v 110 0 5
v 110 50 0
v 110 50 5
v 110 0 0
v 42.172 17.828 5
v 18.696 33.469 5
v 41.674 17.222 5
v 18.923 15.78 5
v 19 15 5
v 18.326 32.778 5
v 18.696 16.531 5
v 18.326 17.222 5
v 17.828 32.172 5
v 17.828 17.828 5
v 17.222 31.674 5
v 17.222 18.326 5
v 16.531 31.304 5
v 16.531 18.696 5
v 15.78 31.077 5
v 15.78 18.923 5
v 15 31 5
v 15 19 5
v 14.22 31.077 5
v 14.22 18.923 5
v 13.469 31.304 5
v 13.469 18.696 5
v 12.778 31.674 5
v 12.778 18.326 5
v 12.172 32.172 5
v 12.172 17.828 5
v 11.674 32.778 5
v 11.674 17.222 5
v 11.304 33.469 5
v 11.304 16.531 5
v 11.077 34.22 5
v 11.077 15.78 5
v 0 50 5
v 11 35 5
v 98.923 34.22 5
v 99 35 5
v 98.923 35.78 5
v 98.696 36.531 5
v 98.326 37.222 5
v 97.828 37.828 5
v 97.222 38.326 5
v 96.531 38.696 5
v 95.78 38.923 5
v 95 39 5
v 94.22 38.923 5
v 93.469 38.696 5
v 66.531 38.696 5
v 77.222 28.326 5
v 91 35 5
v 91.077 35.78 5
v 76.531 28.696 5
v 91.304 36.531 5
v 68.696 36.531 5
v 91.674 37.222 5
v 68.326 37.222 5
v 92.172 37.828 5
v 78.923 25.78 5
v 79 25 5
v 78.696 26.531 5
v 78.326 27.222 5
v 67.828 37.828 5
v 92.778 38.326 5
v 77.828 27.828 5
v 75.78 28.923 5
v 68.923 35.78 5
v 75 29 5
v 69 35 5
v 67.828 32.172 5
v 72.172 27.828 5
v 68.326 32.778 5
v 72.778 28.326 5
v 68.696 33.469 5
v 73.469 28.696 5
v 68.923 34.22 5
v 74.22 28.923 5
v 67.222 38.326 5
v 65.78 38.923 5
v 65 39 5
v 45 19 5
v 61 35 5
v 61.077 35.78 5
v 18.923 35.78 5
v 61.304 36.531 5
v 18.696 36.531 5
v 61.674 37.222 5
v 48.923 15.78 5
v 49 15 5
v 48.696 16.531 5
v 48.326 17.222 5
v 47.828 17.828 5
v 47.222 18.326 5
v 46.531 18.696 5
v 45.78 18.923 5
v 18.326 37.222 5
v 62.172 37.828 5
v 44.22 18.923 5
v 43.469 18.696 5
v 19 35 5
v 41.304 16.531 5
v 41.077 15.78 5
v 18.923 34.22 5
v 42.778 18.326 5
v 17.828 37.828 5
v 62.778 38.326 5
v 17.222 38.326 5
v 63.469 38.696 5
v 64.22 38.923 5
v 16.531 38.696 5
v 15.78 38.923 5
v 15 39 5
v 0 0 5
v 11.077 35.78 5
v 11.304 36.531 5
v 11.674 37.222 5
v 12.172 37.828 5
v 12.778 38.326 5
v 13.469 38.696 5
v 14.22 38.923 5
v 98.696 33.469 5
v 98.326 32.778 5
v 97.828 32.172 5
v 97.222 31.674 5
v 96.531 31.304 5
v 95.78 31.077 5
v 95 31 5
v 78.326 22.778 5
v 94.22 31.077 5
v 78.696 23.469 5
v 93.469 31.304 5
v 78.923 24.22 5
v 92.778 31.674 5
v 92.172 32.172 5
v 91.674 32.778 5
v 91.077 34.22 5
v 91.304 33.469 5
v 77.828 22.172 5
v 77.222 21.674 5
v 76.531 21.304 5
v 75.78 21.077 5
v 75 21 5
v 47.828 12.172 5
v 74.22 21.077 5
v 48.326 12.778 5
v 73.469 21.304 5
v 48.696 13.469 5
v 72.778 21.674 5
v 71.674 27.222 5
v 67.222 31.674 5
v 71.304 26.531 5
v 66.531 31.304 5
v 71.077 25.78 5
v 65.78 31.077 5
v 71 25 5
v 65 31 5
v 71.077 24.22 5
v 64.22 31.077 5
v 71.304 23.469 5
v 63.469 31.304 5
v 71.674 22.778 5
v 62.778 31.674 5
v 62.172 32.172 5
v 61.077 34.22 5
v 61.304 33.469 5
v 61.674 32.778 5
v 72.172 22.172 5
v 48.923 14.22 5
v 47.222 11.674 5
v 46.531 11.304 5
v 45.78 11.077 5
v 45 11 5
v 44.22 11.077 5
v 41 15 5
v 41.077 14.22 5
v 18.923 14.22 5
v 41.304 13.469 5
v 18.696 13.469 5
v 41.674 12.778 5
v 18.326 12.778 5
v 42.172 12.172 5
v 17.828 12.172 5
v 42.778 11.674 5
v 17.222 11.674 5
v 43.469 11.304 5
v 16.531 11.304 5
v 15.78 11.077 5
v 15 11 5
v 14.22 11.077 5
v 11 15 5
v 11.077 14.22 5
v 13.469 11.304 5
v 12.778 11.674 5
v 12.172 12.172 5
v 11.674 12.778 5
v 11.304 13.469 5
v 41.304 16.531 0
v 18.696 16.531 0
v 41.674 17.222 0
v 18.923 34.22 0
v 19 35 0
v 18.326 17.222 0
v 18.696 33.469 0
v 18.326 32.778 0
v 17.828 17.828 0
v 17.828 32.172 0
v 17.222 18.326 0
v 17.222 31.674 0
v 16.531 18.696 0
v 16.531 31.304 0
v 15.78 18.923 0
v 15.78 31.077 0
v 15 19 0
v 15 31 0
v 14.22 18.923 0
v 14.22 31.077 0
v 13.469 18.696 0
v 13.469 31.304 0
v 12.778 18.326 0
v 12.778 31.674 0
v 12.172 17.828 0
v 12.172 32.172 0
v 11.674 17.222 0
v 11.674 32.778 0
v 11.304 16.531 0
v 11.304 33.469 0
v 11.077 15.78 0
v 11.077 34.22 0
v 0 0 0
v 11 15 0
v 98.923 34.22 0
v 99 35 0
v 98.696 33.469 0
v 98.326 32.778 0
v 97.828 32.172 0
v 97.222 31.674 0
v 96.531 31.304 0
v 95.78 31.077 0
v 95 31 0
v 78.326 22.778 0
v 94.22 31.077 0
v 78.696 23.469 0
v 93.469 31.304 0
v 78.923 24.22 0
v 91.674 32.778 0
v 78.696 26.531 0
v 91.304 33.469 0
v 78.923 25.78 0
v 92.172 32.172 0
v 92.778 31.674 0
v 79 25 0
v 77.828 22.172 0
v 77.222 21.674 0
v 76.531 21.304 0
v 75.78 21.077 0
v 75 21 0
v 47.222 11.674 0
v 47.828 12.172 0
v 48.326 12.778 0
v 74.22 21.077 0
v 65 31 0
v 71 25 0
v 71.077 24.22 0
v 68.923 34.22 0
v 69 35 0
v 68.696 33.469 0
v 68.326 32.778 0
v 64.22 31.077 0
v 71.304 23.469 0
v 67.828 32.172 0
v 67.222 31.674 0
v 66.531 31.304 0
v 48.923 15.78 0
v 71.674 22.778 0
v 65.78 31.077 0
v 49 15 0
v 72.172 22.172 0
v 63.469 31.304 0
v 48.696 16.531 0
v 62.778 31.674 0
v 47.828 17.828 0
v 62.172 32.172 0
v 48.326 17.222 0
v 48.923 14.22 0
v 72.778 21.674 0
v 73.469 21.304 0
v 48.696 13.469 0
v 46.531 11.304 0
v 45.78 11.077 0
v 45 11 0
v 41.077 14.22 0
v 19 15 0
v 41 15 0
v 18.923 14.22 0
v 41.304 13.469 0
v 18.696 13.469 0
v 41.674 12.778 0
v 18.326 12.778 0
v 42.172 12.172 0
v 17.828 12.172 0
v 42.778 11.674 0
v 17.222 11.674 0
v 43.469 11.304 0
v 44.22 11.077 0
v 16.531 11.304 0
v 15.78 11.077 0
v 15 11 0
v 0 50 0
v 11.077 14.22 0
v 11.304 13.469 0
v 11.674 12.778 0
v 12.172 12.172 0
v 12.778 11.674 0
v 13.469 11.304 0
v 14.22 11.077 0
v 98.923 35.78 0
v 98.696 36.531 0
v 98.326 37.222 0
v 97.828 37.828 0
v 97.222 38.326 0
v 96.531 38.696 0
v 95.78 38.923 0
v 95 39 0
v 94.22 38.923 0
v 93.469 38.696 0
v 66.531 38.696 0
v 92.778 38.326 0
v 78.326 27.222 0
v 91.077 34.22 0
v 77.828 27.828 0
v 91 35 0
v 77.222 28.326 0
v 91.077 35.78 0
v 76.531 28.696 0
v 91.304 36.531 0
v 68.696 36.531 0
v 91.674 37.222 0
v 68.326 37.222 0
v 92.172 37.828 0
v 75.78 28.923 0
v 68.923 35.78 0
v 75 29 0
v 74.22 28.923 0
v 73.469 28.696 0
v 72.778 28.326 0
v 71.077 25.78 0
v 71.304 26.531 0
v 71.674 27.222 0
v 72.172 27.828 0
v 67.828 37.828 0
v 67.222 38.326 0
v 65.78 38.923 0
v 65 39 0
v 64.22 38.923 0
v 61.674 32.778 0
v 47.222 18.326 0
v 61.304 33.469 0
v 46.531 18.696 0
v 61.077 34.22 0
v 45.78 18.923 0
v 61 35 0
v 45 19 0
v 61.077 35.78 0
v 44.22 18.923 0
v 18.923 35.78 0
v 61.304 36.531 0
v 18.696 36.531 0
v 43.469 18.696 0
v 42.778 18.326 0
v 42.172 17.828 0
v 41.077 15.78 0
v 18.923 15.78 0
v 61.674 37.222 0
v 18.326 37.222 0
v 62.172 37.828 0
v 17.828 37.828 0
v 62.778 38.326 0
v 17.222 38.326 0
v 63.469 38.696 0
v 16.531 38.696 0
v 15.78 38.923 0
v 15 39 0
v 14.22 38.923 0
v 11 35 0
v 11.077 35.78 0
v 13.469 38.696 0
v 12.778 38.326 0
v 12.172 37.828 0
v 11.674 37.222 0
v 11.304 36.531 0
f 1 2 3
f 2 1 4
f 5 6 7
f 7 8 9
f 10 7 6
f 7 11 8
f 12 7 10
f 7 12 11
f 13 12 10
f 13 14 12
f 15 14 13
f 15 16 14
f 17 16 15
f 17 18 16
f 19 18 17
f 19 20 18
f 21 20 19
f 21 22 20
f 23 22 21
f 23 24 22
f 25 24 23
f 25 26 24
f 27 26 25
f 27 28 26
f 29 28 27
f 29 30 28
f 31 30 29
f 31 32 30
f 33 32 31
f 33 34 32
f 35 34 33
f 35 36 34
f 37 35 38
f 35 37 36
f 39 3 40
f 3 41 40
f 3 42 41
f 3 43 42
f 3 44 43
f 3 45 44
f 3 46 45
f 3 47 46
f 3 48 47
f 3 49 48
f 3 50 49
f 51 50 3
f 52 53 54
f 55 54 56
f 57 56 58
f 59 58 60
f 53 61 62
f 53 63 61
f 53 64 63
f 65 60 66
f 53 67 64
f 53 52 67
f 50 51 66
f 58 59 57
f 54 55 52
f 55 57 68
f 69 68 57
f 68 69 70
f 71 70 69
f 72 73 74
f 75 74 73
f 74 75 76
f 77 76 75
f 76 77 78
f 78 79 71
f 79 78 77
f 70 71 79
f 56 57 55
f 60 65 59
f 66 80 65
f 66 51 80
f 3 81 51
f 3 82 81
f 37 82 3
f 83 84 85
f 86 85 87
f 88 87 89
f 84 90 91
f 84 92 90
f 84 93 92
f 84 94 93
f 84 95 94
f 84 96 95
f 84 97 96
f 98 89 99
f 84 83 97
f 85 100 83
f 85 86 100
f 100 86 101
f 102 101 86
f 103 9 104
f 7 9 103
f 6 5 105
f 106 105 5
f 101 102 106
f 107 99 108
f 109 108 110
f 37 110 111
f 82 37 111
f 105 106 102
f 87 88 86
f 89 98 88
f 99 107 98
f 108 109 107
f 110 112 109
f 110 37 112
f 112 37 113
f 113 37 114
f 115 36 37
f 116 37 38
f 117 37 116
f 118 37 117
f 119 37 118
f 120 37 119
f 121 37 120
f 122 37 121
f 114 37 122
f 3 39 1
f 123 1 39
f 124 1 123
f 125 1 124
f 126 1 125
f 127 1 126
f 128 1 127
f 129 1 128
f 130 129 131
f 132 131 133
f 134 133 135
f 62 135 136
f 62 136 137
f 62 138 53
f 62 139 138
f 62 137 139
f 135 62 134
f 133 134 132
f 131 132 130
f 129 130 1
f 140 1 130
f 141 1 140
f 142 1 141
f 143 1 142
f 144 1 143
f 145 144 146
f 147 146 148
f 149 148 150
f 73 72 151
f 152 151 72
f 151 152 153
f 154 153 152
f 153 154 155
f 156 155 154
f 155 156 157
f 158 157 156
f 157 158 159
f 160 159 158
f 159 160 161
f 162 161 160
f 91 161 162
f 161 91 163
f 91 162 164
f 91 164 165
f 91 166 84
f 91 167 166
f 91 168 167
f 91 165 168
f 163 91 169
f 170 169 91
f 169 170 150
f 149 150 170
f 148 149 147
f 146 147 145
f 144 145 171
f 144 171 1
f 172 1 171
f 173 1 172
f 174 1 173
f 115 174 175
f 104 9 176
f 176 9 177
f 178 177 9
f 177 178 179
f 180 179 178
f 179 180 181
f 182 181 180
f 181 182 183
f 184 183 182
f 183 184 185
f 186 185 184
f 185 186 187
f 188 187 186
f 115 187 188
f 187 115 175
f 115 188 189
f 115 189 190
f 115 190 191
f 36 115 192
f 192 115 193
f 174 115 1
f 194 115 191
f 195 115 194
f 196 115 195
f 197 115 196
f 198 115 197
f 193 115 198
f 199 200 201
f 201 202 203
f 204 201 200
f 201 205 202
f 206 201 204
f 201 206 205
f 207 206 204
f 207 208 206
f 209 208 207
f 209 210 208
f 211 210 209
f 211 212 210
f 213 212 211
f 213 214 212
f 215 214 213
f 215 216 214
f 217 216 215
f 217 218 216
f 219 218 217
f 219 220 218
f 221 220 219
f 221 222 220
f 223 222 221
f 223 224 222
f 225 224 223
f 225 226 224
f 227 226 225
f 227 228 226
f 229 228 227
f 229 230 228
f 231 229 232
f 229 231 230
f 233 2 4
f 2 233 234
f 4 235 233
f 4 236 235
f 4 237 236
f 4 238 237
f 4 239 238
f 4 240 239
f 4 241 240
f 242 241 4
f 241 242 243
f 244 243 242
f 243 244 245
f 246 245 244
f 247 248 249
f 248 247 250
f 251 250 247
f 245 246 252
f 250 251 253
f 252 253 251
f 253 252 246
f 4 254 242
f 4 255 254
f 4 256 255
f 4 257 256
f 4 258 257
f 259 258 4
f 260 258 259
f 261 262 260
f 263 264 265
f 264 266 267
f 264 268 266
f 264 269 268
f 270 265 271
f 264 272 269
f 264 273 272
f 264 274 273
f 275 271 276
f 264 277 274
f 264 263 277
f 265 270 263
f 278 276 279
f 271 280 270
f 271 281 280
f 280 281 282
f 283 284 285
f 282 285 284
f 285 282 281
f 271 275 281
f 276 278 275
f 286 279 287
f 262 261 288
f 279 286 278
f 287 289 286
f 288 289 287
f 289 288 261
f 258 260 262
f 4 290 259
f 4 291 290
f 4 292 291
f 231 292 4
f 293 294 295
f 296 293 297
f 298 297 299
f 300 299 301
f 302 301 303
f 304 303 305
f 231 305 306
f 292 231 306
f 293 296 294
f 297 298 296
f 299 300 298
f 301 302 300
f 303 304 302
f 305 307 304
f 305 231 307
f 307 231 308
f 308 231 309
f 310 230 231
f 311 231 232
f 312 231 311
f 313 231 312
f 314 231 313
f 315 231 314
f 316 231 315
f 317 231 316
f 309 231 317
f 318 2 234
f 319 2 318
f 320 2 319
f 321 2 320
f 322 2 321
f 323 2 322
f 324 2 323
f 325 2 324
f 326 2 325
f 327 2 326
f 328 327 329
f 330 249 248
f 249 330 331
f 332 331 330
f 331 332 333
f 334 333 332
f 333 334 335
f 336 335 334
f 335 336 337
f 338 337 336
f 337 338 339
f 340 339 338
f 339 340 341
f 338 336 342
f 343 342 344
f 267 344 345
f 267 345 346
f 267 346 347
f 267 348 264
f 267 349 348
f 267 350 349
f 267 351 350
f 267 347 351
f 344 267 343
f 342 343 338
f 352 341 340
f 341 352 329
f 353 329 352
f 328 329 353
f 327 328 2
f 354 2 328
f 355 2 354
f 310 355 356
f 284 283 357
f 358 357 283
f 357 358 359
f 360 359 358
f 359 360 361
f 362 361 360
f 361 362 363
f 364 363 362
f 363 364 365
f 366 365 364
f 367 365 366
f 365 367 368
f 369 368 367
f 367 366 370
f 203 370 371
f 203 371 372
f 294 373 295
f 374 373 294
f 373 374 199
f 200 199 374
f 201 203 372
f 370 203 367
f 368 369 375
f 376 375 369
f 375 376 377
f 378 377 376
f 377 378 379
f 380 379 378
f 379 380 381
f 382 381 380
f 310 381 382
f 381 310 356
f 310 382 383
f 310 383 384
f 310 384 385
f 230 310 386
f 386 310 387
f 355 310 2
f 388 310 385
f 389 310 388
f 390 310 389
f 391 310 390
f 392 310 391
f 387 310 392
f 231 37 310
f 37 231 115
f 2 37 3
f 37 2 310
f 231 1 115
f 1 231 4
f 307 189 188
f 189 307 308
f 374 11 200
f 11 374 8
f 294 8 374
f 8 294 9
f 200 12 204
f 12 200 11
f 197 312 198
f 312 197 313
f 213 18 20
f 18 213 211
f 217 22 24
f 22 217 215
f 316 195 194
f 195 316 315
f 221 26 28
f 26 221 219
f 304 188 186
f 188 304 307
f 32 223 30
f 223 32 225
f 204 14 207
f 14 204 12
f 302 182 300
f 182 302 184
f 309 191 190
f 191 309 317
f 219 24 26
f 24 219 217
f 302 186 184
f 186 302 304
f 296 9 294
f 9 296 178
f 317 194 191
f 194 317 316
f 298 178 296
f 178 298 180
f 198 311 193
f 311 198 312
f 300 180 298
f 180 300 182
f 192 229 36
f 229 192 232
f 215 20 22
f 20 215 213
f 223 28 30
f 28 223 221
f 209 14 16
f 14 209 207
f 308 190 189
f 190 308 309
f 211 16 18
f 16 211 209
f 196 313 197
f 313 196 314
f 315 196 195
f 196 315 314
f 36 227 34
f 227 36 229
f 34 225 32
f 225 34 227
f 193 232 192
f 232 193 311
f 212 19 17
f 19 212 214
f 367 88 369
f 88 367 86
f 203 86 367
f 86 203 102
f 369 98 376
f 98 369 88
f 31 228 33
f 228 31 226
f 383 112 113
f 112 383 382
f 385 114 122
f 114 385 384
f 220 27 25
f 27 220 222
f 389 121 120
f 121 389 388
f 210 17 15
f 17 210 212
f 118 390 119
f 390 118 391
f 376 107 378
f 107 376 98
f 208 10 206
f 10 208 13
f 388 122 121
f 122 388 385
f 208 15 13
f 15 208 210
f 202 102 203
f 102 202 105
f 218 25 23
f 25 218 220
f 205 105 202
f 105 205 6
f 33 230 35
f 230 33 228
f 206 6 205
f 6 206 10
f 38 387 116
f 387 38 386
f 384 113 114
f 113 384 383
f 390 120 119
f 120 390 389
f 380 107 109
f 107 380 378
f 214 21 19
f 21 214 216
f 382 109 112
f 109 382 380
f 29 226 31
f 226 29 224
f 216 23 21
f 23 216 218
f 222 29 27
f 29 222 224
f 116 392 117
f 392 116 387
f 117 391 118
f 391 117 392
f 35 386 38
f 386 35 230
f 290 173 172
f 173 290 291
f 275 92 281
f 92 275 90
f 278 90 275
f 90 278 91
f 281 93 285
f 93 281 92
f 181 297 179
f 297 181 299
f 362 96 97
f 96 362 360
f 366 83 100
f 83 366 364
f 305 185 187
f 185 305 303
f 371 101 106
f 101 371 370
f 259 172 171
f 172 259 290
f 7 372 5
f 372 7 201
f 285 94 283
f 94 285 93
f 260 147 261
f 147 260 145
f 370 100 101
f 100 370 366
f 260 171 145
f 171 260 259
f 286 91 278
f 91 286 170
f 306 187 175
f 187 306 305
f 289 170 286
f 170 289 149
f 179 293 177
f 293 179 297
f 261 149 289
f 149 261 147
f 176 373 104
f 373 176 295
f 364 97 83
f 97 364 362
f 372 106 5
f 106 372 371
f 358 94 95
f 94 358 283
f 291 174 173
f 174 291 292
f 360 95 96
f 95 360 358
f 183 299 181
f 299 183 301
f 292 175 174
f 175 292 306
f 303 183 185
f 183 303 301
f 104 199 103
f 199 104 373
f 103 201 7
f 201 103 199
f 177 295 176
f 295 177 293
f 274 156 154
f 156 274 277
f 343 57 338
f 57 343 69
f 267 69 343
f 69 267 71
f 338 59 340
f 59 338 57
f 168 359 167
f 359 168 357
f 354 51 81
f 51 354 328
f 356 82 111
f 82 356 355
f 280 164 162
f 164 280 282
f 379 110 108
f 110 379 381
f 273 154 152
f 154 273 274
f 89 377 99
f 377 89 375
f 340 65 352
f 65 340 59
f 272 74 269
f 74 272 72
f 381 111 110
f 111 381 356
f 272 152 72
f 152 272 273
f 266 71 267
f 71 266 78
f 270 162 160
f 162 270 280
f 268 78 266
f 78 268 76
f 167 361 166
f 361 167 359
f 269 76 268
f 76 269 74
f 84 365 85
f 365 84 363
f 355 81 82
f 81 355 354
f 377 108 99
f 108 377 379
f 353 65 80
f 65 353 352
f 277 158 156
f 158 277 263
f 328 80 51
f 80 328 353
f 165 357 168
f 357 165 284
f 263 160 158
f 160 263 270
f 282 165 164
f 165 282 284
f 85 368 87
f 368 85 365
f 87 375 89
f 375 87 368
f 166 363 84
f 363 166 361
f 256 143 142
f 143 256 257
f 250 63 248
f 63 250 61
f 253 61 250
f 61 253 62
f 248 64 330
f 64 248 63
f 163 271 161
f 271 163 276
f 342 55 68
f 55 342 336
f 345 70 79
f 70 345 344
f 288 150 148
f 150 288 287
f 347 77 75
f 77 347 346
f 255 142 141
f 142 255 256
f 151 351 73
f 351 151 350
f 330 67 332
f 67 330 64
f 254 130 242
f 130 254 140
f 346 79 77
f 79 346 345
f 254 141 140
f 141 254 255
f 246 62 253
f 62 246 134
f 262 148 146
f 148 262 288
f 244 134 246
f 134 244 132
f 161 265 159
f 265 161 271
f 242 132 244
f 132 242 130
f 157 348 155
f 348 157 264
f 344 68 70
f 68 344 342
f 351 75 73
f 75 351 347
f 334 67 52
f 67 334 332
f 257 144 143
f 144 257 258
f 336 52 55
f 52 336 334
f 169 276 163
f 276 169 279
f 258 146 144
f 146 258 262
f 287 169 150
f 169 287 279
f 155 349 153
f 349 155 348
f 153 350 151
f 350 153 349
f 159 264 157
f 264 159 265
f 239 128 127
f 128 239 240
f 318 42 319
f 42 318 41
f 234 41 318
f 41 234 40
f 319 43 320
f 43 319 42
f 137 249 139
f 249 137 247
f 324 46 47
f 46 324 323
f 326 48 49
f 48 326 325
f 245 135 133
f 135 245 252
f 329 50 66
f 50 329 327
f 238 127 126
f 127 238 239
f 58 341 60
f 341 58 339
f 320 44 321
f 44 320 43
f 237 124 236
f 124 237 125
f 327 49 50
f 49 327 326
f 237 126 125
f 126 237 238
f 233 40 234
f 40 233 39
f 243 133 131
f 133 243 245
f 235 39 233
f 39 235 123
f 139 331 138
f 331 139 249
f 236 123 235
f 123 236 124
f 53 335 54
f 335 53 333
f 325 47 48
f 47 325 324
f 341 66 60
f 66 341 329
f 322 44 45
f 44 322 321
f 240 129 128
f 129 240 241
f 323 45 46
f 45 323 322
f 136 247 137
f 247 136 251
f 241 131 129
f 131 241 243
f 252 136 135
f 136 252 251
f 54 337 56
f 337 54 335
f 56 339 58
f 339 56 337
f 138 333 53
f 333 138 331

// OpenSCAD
$fn = 32;

// ----------------------------------------------------------------------
// Hole field: plate with holes at given coordinates
// ----------------------------------------------------------------------

// --- parameters (mm) ---
plate_l = 110;            // plate length, X
plate_w = 50;             // plate width, Y
plate_t = 5;              // plate thickness, Z
hole_d = 8;               // hole diameter

difference() {
  cube([plate_l, plate_w, plate_t]);
  translate([15, 15, -1]) cylinder(h = plate_t + 2, d = hole_d);
  translate([15, 35, -1]) cylinder(h = plate_t + 2, d = hole_d);
  translate([45, 15, -1]) cylinder(h = plate_t + 2, d = hole_d);
  translate([65, 35, -1]) cylinder(h = plate_t + 2, d = hole_d);
  translate([75, 25, -1]) cylinder(h = plate_t + 2, d = hole_d);
  translate([95, 35, -1]) cylinder(h = plate_t + 2, d = hole_d);
}
